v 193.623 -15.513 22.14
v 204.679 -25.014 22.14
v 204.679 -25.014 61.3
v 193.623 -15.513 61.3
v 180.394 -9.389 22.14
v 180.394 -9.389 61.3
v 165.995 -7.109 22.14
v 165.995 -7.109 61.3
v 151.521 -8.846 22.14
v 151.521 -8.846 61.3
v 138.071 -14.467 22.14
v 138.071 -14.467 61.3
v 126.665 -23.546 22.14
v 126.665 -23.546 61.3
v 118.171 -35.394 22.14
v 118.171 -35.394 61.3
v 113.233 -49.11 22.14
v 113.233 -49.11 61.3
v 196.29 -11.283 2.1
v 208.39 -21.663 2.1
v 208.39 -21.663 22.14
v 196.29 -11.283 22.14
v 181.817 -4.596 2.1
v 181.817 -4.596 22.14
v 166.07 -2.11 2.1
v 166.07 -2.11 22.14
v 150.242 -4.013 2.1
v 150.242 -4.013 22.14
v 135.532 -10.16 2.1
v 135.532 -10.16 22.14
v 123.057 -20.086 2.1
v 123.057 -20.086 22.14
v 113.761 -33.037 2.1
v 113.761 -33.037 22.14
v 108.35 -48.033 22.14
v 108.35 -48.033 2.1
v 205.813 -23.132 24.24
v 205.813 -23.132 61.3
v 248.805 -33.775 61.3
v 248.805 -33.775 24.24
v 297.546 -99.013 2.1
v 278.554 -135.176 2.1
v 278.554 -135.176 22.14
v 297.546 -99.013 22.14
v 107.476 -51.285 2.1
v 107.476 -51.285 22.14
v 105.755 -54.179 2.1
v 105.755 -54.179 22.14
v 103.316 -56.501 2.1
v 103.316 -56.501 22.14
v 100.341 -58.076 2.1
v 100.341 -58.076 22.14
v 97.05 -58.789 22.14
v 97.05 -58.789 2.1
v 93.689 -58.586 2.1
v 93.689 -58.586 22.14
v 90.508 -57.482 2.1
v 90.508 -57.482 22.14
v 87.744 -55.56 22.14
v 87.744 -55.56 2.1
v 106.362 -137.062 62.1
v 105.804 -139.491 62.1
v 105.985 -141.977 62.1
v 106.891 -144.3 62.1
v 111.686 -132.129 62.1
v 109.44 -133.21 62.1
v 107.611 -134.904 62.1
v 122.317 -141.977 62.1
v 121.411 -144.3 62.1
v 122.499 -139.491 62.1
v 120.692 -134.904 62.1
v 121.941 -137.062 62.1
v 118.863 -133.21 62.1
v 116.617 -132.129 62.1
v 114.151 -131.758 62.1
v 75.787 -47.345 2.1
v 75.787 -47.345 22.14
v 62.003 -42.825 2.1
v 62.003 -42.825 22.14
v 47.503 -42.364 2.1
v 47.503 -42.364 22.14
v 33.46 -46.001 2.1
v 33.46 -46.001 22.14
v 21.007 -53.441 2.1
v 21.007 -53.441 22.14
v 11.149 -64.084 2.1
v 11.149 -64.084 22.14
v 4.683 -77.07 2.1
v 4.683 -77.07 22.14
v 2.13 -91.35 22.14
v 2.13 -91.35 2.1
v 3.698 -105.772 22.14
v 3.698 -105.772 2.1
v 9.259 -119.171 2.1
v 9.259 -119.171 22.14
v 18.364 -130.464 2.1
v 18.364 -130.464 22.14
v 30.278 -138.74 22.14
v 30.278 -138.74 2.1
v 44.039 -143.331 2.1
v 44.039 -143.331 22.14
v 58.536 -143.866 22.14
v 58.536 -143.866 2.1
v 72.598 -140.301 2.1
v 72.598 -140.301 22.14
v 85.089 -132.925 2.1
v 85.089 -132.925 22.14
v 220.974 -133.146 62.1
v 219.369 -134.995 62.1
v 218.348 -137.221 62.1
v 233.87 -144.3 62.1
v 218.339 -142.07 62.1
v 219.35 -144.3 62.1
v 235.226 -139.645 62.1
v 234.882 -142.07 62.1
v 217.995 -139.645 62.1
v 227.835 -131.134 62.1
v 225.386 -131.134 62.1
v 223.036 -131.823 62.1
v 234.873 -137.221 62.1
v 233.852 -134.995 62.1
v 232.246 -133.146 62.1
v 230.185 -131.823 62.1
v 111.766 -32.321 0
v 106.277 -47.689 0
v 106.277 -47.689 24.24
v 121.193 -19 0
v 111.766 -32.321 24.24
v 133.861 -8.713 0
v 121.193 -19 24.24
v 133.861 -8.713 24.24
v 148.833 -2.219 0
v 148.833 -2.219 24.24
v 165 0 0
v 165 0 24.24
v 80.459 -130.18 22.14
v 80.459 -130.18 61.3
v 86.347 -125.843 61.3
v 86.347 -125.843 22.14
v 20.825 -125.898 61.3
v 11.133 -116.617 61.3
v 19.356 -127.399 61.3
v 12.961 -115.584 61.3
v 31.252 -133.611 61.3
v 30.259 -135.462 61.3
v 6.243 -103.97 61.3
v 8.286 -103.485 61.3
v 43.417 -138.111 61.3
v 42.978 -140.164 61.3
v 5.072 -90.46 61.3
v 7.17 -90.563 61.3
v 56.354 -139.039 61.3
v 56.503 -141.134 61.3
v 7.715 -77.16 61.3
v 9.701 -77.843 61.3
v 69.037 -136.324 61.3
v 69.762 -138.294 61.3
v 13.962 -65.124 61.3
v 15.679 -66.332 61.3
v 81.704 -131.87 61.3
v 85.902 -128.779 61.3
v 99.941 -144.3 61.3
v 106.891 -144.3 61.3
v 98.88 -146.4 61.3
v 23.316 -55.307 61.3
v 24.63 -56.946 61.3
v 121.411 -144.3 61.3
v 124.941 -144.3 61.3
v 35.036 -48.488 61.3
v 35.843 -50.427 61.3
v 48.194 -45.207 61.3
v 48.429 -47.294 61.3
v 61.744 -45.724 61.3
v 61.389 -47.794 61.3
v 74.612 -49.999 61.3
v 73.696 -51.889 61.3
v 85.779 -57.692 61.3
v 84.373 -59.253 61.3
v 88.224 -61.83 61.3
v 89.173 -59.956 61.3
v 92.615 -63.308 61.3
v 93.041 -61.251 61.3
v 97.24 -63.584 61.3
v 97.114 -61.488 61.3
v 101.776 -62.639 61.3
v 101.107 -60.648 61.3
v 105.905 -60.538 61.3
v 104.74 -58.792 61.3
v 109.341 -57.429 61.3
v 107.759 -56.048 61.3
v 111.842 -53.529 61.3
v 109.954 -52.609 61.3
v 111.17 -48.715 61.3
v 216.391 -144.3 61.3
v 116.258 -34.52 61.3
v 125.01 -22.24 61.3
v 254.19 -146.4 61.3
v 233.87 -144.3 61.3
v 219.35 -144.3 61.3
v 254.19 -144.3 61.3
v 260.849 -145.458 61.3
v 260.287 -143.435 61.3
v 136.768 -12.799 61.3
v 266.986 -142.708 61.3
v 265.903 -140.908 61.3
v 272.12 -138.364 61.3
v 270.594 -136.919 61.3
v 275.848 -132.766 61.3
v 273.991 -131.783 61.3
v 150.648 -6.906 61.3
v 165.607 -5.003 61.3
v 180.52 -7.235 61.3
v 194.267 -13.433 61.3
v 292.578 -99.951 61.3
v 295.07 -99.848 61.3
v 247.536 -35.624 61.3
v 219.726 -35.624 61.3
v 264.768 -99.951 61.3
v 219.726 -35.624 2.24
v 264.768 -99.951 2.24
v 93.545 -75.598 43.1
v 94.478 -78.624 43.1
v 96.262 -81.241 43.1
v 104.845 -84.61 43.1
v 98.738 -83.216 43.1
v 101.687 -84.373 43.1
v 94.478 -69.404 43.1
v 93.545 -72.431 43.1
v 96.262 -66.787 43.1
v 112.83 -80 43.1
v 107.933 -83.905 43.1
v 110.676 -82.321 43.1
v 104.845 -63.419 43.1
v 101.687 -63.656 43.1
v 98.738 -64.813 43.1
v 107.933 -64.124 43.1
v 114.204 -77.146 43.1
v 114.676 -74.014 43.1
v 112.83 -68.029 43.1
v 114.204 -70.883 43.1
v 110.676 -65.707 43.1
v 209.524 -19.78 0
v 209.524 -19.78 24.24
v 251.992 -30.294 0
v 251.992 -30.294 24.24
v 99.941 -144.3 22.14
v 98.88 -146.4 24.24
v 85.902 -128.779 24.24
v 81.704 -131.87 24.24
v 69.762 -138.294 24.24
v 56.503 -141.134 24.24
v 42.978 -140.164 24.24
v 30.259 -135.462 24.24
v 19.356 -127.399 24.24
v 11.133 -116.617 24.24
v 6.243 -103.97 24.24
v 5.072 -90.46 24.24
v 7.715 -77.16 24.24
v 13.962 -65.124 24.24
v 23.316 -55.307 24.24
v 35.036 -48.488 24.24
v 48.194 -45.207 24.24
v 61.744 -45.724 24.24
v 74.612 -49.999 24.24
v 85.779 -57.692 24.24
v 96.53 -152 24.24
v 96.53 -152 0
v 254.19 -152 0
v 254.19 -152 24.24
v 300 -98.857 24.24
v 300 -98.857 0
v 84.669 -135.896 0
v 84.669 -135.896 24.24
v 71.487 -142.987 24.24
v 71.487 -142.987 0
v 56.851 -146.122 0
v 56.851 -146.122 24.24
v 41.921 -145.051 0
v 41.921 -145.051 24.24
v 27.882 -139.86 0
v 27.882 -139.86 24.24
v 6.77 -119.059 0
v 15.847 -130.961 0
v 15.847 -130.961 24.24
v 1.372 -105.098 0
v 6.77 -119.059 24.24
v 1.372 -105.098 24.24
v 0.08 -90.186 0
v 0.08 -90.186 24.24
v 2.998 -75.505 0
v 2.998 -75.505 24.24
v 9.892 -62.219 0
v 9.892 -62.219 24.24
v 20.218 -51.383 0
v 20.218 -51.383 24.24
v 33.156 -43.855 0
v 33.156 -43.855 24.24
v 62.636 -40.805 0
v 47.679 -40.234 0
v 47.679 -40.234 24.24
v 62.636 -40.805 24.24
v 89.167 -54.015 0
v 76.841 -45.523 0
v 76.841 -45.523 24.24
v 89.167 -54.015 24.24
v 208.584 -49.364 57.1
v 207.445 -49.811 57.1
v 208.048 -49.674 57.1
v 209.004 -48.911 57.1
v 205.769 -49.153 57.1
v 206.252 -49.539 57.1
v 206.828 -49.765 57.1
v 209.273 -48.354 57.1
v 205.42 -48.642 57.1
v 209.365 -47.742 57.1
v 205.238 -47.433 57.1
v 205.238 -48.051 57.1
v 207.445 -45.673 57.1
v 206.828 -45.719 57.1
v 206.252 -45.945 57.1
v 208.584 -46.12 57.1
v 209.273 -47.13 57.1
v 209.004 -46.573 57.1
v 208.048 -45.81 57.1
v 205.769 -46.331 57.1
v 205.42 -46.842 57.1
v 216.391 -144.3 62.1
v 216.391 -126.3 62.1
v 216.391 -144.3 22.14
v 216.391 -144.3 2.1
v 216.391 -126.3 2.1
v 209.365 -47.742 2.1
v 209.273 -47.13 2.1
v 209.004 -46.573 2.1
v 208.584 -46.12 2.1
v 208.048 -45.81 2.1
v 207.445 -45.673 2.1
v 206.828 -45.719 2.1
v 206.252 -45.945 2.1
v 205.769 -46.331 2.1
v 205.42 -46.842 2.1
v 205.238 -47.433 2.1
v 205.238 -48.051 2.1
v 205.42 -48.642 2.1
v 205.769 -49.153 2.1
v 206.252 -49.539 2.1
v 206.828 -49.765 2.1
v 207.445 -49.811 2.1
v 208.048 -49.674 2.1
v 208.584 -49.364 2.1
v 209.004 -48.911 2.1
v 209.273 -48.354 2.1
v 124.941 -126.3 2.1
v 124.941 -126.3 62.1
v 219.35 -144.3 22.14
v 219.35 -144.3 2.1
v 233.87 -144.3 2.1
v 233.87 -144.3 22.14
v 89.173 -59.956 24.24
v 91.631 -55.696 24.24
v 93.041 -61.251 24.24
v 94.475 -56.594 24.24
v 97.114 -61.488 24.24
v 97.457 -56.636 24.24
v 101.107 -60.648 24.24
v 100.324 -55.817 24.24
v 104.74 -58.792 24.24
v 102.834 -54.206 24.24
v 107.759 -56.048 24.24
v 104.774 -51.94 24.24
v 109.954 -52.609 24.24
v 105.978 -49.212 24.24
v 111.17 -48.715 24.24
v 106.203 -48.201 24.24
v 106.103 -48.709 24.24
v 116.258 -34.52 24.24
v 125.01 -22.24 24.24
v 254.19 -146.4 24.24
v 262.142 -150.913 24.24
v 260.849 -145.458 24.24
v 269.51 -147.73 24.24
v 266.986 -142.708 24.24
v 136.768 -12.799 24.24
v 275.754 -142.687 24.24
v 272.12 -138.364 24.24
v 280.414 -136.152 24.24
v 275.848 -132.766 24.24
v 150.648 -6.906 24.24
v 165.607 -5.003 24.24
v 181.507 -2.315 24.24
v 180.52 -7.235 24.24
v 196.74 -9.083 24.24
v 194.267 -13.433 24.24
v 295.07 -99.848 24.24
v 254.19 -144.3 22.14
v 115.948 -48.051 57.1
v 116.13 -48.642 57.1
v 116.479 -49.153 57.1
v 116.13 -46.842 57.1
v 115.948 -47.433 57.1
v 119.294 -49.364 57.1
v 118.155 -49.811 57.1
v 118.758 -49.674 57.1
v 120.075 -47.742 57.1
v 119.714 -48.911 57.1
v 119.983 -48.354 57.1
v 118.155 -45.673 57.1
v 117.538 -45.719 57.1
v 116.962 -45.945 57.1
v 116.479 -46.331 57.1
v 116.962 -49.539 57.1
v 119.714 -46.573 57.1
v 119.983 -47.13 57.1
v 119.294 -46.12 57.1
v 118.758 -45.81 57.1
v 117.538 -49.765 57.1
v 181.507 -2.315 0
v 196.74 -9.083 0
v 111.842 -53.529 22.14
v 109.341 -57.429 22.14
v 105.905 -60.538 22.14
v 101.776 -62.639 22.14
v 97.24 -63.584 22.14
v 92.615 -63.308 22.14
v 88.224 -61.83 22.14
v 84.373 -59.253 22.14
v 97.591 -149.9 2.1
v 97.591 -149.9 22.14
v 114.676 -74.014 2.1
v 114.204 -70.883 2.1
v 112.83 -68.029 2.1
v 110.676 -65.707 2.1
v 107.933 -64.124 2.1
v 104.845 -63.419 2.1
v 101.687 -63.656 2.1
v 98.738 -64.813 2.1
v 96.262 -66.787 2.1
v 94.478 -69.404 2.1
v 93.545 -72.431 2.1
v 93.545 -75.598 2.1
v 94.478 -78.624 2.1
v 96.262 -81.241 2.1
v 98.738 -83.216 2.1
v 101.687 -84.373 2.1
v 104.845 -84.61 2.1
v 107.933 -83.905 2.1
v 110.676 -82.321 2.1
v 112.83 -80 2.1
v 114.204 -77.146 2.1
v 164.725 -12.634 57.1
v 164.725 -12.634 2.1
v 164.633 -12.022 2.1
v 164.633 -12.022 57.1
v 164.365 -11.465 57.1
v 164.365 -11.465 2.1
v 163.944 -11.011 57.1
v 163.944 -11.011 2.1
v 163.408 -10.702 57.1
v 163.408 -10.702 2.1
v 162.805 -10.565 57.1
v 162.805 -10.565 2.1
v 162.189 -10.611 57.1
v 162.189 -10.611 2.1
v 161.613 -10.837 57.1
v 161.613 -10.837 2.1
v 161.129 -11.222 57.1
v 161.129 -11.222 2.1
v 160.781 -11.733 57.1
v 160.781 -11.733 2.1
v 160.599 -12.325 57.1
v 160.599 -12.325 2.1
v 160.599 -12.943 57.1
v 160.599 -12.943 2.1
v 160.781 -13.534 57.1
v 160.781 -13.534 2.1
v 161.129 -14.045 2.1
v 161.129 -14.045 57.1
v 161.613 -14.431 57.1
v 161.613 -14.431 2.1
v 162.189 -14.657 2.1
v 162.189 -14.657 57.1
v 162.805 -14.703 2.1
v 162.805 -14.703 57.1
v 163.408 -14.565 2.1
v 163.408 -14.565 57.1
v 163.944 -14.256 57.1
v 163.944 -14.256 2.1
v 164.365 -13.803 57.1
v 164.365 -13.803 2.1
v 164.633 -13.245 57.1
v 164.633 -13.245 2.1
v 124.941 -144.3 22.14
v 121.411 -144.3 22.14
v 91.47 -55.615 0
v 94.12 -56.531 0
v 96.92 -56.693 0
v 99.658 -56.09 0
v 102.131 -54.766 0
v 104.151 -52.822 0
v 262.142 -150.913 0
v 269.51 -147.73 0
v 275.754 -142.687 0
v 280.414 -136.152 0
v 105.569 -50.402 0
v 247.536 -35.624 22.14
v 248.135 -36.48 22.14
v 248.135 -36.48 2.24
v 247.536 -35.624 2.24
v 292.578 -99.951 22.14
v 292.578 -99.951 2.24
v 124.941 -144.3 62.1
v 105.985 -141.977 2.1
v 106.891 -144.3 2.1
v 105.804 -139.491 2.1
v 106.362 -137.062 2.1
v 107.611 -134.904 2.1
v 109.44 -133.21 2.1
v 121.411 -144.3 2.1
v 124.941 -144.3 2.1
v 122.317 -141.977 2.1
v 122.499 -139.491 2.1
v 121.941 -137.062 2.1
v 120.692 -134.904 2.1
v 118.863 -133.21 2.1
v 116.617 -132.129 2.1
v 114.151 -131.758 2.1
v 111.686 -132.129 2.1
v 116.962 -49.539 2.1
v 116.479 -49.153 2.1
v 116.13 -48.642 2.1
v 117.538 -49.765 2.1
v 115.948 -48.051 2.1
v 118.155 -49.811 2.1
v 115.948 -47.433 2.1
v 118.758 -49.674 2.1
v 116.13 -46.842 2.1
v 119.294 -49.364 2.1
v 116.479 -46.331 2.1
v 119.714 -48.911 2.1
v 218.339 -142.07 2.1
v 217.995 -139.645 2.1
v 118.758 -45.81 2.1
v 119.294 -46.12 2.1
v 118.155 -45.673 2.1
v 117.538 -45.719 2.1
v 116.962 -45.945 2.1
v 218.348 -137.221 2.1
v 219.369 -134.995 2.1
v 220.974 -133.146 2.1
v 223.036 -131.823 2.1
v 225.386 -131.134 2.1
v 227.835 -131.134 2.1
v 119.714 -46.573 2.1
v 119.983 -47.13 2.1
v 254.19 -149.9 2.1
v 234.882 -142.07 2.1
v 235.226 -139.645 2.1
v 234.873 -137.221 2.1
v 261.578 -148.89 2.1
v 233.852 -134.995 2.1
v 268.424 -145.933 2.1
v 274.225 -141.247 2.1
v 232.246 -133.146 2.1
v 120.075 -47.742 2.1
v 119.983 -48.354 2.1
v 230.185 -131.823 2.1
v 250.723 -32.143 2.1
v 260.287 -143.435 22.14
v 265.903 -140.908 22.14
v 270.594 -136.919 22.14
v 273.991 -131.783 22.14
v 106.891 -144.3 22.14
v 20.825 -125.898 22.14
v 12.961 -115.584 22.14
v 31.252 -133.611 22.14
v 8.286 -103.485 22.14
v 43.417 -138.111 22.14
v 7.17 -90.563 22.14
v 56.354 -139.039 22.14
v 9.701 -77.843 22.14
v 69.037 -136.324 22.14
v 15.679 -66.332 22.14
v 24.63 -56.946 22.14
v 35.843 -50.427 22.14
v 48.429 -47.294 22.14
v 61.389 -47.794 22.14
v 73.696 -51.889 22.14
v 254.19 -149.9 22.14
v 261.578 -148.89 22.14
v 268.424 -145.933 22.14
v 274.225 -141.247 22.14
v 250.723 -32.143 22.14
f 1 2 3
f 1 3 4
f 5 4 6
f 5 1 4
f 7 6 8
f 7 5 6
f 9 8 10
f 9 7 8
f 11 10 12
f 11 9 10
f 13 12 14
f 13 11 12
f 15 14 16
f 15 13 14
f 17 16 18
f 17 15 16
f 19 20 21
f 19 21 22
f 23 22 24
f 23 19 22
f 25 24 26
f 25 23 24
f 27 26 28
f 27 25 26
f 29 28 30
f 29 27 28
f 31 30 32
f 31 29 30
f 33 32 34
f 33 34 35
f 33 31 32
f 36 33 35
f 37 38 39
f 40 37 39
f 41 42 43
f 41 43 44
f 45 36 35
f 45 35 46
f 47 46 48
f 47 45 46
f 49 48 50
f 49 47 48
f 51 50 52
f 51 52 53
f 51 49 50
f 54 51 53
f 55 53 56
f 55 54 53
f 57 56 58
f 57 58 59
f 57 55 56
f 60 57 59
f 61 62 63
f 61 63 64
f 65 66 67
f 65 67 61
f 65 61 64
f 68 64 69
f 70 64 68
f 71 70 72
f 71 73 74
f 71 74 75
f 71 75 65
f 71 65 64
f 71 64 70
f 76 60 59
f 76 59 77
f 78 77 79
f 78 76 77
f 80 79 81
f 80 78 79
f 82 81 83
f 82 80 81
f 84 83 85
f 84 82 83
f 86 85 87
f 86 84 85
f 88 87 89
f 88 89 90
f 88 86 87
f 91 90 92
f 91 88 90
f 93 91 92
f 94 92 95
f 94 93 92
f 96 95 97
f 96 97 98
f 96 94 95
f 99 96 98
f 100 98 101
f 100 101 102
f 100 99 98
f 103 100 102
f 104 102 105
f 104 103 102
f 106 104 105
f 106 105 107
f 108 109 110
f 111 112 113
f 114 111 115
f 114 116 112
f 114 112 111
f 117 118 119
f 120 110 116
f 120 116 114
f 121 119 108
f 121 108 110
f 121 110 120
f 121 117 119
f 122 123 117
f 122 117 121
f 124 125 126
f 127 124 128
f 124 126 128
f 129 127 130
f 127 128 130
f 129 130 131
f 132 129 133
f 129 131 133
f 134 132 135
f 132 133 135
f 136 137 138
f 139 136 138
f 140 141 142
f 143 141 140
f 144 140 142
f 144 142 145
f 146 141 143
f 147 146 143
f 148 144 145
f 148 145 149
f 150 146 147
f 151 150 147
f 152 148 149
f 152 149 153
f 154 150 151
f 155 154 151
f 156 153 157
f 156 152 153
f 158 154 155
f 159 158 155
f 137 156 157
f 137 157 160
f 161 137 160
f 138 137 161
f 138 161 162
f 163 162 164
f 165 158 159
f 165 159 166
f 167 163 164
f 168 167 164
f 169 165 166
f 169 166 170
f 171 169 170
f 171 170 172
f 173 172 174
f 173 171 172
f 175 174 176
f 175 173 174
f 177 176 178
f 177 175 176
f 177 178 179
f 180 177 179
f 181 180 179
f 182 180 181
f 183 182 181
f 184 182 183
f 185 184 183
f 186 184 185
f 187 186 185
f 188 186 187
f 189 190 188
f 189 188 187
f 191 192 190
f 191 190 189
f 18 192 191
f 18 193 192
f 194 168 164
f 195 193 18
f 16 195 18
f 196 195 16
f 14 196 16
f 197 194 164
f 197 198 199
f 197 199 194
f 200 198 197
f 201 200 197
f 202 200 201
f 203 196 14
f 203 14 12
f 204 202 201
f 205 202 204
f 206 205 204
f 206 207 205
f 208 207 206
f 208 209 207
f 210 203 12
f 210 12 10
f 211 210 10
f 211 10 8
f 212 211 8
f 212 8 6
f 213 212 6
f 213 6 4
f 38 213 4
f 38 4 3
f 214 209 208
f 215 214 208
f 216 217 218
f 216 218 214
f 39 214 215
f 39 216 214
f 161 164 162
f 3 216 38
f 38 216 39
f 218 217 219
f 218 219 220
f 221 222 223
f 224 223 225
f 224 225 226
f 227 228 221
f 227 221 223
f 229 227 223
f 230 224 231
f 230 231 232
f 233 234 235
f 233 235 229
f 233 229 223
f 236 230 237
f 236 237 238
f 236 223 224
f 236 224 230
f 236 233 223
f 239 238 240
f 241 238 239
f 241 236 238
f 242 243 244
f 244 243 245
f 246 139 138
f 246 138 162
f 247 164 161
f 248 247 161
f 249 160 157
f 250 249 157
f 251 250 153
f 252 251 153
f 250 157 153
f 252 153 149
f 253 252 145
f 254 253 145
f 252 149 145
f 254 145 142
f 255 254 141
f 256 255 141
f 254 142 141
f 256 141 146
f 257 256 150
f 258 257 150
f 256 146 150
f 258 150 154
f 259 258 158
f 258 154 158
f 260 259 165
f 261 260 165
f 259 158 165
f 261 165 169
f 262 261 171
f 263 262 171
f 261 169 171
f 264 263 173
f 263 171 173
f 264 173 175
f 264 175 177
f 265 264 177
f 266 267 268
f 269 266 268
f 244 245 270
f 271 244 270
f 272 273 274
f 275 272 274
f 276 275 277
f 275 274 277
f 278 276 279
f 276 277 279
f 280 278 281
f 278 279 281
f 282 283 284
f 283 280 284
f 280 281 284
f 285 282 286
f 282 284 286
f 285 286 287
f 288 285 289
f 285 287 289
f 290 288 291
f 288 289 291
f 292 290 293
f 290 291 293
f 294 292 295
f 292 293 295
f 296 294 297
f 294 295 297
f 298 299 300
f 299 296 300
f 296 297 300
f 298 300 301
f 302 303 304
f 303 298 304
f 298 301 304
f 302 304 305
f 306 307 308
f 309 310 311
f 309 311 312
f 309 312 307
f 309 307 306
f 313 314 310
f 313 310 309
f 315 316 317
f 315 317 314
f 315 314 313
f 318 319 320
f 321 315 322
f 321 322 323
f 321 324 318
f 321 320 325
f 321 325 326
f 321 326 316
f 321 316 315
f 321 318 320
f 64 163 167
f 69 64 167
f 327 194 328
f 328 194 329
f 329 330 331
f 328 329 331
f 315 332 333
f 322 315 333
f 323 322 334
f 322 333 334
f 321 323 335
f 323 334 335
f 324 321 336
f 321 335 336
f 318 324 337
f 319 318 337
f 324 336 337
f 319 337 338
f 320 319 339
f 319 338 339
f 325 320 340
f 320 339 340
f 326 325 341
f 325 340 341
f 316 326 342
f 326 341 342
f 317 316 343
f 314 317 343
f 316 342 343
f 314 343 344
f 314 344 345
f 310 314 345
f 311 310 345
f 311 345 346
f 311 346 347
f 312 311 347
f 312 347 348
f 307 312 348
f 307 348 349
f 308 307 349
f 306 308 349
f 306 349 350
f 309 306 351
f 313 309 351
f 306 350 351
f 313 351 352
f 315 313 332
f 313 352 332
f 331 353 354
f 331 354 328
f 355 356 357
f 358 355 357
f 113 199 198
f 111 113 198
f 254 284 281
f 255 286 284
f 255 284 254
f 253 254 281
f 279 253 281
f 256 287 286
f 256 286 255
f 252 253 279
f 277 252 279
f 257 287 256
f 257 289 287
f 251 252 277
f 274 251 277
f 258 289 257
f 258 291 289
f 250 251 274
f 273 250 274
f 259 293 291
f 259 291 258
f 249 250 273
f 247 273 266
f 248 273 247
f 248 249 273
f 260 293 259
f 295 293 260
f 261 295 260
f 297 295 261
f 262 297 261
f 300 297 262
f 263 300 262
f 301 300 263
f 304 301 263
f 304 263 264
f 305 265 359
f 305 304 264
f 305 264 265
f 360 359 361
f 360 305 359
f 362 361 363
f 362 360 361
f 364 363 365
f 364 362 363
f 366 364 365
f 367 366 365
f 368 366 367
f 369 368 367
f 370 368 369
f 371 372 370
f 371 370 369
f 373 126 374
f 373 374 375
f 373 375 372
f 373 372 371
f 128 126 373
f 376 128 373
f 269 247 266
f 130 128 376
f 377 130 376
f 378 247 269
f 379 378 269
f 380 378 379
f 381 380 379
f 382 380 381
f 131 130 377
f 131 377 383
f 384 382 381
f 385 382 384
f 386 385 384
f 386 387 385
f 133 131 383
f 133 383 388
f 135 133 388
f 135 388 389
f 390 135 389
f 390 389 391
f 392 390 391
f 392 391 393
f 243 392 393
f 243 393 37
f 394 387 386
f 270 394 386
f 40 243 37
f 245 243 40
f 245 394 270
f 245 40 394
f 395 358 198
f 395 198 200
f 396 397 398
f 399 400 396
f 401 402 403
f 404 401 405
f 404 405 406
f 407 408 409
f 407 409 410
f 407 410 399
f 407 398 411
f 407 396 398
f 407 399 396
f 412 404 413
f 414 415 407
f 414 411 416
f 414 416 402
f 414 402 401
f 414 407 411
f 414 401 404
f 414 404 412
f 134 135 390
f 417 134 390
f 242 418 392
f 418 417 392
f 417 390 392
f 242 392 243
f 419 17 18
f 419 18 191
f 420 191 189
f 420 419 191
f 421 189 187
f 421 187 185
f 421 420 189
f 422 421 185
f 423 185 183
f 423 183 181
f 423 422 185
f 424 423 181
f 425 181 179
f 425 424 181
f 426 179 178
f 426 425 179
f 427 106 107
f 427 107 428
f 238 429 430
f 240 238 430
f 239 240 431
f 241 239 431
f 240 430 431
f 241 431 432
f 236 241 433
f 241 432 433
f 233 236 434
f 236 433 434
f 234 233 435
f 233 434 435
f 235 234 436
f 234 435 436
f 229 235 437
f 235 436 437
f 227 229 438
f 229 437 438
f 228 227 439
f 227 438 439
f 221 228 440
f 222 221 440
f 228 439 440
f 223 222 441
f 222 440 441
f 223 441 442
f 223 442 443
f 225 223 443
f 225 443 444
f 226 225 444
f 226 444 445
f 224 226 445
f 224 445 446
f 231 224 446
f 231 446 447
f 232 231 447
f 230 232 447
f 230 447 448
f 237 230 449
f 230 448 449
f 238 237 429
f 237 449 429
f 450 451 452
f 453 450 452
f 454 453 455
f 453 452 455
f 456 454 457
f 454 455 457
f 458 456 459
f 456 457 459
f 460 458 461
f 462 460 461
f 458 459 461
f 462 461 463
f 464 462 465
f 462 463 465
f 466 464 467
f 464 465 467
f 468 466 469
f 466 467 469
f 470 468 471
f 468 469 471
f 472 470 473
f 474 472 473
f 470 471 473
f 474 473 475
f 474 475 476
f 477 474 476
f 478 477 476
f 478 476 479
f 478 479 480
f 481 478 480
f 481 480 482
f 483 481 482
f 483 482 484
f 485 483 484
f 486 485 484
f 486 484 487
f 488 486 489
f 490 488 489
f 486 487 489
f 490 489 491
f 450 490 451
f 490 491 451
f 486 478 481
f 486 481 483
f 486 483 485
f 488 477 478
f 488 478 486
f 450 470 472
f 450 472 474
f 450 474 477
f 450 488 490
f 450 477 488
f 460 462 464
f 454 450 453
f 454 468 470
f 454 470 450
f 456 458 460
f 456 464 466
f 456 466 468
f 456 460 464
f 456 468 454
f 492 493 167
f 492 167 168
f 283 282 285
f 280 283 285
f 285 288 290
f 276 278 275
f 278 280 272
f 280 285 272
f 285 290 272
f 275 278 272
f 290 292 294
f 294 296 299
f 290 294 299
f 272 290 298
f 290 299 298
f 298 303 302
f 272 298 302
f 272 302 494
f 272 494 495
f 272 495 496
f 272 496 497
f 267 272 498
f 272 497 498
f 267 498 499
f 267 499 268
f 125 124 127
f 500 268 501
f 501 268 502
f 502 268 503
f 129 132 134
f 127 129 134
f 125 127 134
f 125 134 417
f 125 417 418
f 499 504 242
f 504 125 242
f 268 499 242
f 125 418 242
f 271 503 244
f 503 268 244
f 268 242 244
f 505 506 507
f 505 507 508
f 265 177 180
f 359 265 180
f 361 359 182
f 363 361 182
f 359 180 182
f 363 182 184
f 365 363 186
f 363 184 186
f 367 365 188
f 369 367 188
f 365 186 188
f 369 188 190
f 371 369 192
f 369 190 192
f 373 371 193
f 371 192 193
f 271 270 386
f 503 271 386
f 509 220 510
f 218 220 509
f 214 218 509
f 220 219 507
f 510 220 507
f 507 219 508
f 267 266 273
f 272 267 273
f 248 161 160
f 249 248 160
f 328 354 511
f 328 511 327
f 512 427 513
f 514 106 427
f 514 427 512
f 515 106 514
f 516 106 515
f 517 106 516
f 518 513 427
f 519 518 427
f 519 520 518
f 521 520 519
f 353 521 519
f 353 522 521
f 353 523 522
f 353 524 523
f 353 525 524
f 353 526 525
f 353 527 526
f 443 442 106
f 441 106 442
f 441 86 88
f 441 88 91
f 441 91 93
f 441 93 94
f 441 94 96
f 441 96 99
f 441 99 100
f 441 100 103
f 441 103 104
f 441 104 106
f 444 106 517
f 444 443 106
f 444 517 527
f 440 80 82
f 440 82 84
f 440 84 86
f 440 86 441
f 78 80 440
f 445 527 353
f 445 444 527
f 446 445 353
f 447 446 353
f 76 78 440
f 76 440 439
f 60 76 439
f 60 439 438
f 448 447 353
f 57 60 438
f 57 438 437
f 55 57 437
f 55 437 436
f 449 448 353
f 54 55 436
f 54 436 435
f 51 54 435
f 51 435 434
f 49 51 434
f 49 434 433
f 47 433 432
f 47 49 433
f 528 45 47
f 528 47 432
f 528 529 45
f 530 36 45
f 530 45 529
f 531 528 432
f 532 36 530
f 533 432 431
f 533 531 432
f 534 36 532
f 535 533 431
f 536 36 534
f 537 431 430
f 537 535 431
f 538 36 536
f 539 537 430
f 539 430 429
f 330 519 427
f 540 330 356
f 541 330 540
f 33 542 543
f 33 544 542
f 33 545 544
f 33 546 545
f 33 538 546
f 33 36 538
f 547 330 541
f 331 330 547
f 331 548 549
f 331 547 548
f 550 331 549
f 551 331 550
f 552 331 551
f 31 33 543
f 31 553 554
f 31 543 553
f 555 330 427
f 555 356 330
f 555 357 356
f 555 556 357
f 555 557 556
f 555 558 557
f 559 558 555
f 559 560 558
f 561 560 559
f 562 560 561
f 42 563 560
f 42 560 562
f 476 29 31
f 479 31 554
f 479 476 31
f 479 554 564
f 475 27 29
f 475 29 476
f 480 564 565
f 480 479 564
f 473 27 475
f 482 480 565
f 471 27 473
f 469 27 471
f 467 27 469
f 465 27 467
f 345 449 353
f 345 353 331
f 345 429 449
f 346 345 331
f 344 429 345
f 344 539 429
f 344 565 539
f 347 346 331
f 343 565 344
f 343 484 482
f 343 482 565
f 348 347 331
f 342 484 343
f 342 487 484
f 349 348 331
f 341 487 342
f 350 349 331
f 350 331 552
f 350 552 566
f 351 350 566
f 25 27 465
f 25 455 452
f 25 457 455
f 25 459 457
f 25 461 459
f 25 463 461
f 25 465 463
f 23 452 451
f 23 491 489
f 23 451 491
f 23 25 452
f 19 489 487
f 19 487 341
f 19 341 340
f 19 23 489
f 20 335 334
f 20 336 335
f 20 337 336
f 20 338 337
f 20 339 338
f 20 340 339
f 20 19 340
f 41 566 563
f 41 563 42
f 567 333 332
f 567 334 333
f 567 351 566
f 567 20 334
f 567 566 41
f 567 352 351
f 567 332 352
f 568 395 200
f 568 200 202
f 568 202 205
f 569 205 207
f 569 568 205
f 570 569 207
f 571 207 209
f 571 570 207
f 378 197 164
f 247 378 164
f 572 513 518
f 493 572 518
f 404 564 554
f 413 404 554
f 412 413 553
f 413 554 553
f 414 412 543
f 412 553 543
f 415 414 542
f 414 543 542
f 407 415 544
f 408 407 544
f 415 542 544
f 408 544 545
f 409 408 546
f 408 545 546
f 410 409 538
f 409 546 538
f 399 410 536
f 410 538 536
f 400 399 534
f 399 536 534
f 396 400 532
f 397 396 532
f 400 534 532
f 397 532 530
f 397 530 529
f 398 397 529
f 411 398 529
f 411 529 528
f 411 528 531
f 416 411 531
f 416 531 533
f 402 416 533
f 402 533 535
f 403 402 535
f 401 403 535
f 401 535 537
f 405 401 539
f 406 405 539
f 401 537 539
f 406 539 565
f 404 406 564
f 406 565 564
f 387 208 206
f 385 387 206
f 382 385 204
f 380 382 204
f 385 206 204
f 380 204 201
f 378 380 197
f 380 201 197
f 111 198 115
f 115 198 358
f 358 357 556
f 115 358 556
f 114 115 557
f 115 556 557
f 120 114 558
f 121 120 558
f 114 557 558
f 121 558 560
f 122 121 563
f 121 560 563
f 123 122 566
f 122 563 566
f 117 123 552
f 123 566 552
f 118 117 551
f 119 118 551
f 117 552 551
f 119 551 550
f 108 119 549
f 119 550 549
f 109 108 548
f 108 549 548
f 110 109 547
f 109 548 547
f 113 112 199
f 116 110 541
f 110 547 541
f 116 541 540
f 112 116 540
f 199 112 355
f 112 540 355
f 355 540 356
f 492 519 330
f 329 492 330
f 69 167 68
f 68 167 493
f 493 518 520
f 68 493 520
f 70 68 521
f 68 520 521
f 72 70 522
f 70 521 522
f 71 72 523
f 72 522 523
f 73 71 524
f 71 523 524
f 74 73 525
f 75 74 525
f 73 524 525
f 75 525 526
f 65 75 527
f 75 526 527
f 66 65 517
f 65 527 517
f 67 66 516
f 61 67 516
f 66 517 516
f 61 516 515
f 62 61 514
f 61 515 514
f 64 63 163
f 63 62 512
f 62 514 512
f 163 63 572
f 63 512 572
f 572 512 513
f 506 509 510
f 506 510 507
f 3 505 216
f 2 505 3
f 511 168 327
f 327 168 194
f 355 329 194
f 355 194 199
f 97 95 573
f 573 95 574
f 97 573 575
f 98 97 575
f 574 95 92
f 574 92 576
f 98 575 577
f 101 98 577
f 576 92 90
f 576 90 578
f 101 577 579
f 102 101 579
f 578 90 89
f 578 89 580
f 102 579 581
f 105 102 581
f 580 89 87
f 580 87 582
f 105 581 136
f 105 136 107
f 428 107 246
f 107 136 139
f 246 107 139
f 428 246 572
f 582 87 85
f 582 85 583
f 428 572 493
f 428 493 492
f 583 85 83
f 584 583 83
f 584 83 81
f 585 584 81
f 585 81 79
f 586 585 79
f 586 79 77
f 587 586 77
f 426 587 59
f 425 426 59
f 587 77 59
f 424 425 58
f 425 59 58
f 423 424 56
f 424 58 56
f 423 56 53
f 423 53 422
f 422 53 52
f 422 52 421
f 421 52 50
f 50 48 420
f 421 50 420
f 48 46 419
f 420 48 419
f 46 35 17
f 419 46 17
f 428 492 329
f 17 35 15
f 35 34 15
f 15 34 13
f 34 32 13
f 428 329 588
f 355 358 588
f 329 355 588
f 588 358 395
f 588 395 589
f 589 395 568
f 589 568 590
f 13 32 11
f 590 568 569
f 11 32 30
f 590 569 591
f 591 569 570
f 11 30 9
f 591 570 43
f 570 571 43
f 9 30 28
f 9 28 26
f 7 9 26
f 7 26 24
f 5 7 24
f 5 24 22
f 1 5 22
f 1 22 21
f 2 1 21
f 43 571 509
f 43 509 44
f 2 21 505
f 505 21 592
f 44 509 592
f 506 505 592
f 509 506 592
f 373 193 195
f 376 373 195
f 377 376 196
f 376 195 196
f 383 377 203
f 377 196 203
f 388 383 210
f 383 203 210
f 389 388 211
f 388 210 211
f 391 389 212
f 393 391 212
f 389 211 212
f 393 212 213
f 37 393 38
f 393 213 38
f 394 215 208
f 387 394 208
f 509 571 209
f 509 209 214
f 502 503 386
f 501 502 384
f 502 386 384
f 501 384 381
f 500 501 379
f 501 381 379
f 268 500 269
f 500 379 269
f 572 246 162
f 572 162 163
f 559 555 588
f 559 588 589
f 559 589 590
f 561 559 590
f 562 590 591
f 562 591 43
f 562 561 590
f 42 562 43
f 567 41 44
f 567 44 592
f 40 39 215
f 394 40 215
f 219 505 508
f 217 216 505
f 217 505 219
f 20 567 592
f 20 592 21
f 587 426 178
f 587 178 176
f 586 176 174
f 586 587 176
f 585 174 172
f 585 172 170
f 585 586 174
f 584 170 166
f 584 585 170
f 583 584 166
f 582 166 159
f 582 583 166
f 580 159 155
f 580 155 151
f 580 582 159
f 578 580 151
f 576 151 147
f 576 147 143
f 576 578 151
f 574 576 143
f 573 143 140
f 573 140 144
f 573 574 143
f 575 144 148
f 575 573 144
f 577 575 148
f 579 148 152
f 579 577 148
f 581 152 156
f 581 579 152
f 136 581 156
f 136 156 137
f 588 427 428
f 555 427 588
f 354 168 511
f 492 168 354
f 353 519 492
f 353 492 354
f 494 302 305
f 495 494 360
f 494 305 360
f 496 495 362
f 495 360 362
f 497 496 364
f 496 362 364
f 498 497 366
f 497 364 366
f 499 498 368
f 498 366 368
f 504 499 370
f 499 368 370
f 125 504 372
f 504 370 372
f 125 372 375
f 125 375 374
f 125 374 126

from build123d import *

# Parameters (mm, degrees)
SKETCH1_W           = 300
SKETCH1_H           = 152
BOSS_EXTRUDE1_DEPTH = 61.3
CUT_EXTRUDE1_DEPTH  = 342.850391253
CUT_EXTRUDE2_DEPTH  = 37.06
SHELL2_START        = 2.1
SHELL2_DEPTH        = 59.2
SHELL2_2_DEPTH      = 20.04
BOSS_EXTRUDE3_DEPTH = 59.06
SKETCH10_R          = 2.075
BOSS_EXTRUDE4_DEPTH = 55
SKETCH11_R          = 10.625
BOSS_EXTRUDE7_DEPTH = 41
SKETCH12_W          = 91.45
SKETCH12_H          = 18
BOSS_EXTRUDE8_DEPTH = 60


# Read off the part's stored shape, not the designer's step: Shell2
with BuildPart() as part:
    # Sketch1 → Boss-Extrude1 (new body)
    with BuildSketch(Plane.XY):
        with Locations((150, -76)):
            Rectangle(SKETCH1_W, SKETCH1_H)
    extrude(amount=BOSS_EXTRUDE1_DEPTH)

    # Sketch2 → Cut-Extrude1 (cut, through all)
    with BuildSketch(Plane.XY.offset(61.3)):
        with BuildLine():
            ThreePointArc((106.276631817, -47.688784415), (127.175886892, -13.423863754), (165, 0))
            Line((165, 0), (0, 0))
            Line((0, 0), (0, -152))
            Line((0, -152), (96.53, -152))
            Line((96.53, -152), (84.669267872, -135.896130578))
            ThreePointArc((84.669267872, -135.896130578), (0.080288741, -90.185905943), (89.166858478, -54.015432913))
            ThreePointArc((89.166858478, -54.015432913), (99.658448556, -56.089724813), (106.276631817, -47.688784415))
        make_face()
        with BuildLine():
            Line((209.523701897, -19.780104806), (251.991652277, -30.293700311))
            Line((251.991652277, -30.293700311), (300, -98.856726418))
            Line((300, -98.856726418), (300, 0))
            Line((300, 0), (165, 0))
            ThreePointArc((165, 0), (189.359867491, -5.16755654), (209.523701897, -19.780104806))
        make_face()
        with BuildLine():
            Line((300, -152), (300, -98.856726418))
            Line((300, -98.856726418), (280.413634666, -136.151905638))
            ThreePointArc((280.413634666, -136.151905638), (269.510257097, -147.730229239), (254.19, -152))
            Line((254.19, -152), (300, -152))
        make_face()
    extrude(amount=-CUT_EXTRUDE1_DEPTH, mode=Mode.SUBTRACT)

    # Sketch3 → Cut-Extrude2 (cut)
    with BuildSketch(Plane.XY.offset(61.3)):
        with BuildLine():
            ThreePointArc((105.977880822, -49.211605878), (98.92047416, -56.331219446), (89.166858478, -54.015432913))
            ThreePointArc((89.166858478, -54.015432913), (0.080288741, -90.185905943), (84.669267872, -135.896130578))
            Line((84.669267872, -135.896130578), (96.53, -152))
            Line((96.53, -152), (254.19, -152))
            ThreePointArc((254.19, -152), (269.510257097, -147.730229239), (280.413634666, -136.151905638))
            Line((280.413634666, -136.151905638), (300, -98.856726418))
            Line((300, -98.856726418), (251.991652277, -30.293700311))
            Line((251.991652277, -30.293700311), (209.523701897, -19.780104806))
            ThreePointArc((209.523701897, -19.780104806), (149.343332729, -2.078770991), (106.276631817, -47.688784415))
            ThreePointArc((106.276631817, -47.688784415), (106.15614248, -48.455862107), (105.977880822, -49.211605878))
        make_face()
        with BuildLine():
            ThreePointArc((111.170245832, -48.714719047), (150.648055001, -6.905540075), (205.813393405, -23.131762739))
            Line((205.813393405, -23.131762739), (248.805105887, -33.775023623))
            Line((248.805105887, -33.775023623), (295.06982456, -99.847889378))
            Line((295.06982456, -99.847889378), (275.848412222, -132.766220681))
            ThreePointArc((275.848412222, -132.766220681), (266.986159175, -142.707781738), (254.19, -146.4))
            Line((254.19, -146.4), (98.879937279, -146.4))
            Line((98.879937279, -146.4), (85.901779611, -128.778949784))
            Line((85.901779611, -128.778949784), (81.704299385, -131.870454519))
            ThreePointArc((81.704299385, -131.870454519), (5.072473907, -90.460119595), (85.77880864, -57.692146685))
            ThreePointArc((85.77880864, -57.692146685), (101.106669521, -60.648090535), (111.170245832, -48.714719047))
        make_face(mode=Mode.SUBTRACT)
    extrude(amount=-CUT_EXTRUDE2_DEPTH, mode=Mode.SUBTRACT)

    # Shell2 outline → Shell2 (cut)
    with BuildSketch(Plane.XY.offset(SHELL2_START)):
        with BuildLine():
            Line((99.941363565, -144.3), (254.19, -144.3))
            ThreePointArc((254.19, -144.3), (265.902746491, -140.908301855), (273.990848772, -131.782807449))
            Line((273.990848772, -131.782807449), (292.5780859, -99.950556049))
            Line((292.5780859, -99.950556049), (247.536374557, -35.624325774))
            Line((247.536374557, -35.624325774), (204.678827772, -25.014279675))
            ThreePointArc((204.678827772, -25.014279675), (151.521188692, -8.846000687), (113.233094528, -49.109752168))
            ThreePointArc((113.233094528, -49.109752168), (101.775664547, -62.638918954), (84.37325412, -59.25259838))
            ThreePointArc((84.37325412, -59.25259838), (7.169967657, -90.563406667), (80.458940533, -130.179572699))
            Line((80.458940533, -130.179572699), (86.34730258, -125.842709112))
            Line((86.34730258, -125.842709112), (99.941363565, -144.3))
        make_face()
    extrude(amount=SHELL2_DEPTH, mode=Mode.SUBTRACT)

    # Shell2 2 outline → Shell2 2 (cut)
    with BuildSketch(Plane.XY.offset(SHELL2_START)):
        with BuildLine():
            Line((97.591426286, -149.9), (254.19, -149.9))
            ThreePointArc((254.19, -149.9), (268.424080868, -145.932947626), (278.554430318, -135.175504495))
            Line((278.554430318, -135.175504495), (297.545882937, -99.013122297))
            Line((297.545882937, -99.013122297), (250.722920948, -32.143002462))
            Line((250.722920948, -32.143002462), (208.389700931, -21.662761535))
            ThreePointArc((208.389700931, -21.662761535), (150.241547582, -4.012518522), (108.350090196, -48.033475058))
            ThreePointArc((108.350090196, -48.033475058), (100.340566871, -58.076361401), (87.743795173, -55.559742089))
            ThreePointArc((87.743795173, -55.559742089), (2.130315246, -91.350316403), (85.089165222, -132.925096807))
            Line((85.089165222, -132.925096807), (97.591426286, -149.9))
        make_face()
        with BuildLine():
            ThreePointArc((273.990848772, -131.782807449), (265.902746491, -140.908301855), (254.19, -144.3))
            Line((254.19, -144.3), (99.941363565, -144.3))
            Line((99.941363565, -144.3), (86.34730258, -125.842709112))
            Line((86.34730258, -125.842709112), (80.458940533, -130.179572699))
            ThreePointArc((80.458940533, -130.179572699), (7.169967657, -90.563406667), (84.37325412, -59.25259838))
            ThreePointArc((84.37325412, -59.25259838), (101.775664547, -62.638918954), (113.233094528, -49.109752168))
            ThreePointArc((113.233094528, -49.109752168), (151.521188692, -8.846000687), (204.678827772, -25.014279675))
            Line((204.678827772, -25.014279675), (247.536374557, -35.624325774))
            Line((247.536374557, -35.624325774), (292.5780859, -99.950556049))
            Line((292.5780859, -99.950556049), (273.990848772, -131.782807449))
        make_face(mode=Mode.SUBTRACT)
    extrude(amount=SHELL2_2_DEPTH, mode=Mode.SUBTRACT)

    # Sketch9 → Boss-Extrude3 (add)
    with BuildSketch(Plane.XY.offset(61.3)):
        Polygon((247.536374557, -35.624325774), (219.726374557, -35.624325774), (264.7680859, -99.950556049), (292.5780859, -99.950556049), (248.135467364, -36.479918971), align=None)
    extrude(amount=-BOSS_EXTRUDE3_DEPTH)

    # Sketch10 → Boss-Extrude4 (add)
    with BuildSketch(Plane.XY.offset(2.1)):
        with Locations((118, -47.741938271)):
            Circle(SKETCH10_R)
        with Locations((207.29, -47.741938271)):
            Circle(SKETCH10_R)
        with Locations((162.650383795, -12.633773594)):
            Circle(SKETCH10_R)
    extrude(amount=BOSS_EXTRUDE4_DEPTH)

    # Sketch11 → Boss-Extrude7 (add)
    with BuildSketch(Plane.XY.offset(2.1)):
        with Locations((104.050993742, -74.01432733)):
            Circle(SKETCH11_R)
    extrude(amount=BOSS_EXTRUDE7_DEPTH)

    # Sketch12 → Boss-Extrude8 (add)
    with BuildSketch(Plane.XY.offset(2.1)):
        with Locations((170.666363565, -135.3)):
            Rectangle(SKETCH12_W, SKETCH12_H)
        with BuildLine():
            Line((106.891363565, -144.3), (121.411363565, -144.3))
            ThreePointArc((121.411363565, -144.3), (114.151363565, -131.75824963), (106.891363565, -144.3))
        make_face()
        with BuildLine():
            Line((219.350413724, -144.3), (233.870413724, -144.3))
            ThreePointArc((233.870413724, -144.3), (226.610413724, -131.046495008), (219.350413724, -144.3))
        make_face()
    extrude(amount=BOSS_EXTRUDE8_DEPTH)


solid = part.part
